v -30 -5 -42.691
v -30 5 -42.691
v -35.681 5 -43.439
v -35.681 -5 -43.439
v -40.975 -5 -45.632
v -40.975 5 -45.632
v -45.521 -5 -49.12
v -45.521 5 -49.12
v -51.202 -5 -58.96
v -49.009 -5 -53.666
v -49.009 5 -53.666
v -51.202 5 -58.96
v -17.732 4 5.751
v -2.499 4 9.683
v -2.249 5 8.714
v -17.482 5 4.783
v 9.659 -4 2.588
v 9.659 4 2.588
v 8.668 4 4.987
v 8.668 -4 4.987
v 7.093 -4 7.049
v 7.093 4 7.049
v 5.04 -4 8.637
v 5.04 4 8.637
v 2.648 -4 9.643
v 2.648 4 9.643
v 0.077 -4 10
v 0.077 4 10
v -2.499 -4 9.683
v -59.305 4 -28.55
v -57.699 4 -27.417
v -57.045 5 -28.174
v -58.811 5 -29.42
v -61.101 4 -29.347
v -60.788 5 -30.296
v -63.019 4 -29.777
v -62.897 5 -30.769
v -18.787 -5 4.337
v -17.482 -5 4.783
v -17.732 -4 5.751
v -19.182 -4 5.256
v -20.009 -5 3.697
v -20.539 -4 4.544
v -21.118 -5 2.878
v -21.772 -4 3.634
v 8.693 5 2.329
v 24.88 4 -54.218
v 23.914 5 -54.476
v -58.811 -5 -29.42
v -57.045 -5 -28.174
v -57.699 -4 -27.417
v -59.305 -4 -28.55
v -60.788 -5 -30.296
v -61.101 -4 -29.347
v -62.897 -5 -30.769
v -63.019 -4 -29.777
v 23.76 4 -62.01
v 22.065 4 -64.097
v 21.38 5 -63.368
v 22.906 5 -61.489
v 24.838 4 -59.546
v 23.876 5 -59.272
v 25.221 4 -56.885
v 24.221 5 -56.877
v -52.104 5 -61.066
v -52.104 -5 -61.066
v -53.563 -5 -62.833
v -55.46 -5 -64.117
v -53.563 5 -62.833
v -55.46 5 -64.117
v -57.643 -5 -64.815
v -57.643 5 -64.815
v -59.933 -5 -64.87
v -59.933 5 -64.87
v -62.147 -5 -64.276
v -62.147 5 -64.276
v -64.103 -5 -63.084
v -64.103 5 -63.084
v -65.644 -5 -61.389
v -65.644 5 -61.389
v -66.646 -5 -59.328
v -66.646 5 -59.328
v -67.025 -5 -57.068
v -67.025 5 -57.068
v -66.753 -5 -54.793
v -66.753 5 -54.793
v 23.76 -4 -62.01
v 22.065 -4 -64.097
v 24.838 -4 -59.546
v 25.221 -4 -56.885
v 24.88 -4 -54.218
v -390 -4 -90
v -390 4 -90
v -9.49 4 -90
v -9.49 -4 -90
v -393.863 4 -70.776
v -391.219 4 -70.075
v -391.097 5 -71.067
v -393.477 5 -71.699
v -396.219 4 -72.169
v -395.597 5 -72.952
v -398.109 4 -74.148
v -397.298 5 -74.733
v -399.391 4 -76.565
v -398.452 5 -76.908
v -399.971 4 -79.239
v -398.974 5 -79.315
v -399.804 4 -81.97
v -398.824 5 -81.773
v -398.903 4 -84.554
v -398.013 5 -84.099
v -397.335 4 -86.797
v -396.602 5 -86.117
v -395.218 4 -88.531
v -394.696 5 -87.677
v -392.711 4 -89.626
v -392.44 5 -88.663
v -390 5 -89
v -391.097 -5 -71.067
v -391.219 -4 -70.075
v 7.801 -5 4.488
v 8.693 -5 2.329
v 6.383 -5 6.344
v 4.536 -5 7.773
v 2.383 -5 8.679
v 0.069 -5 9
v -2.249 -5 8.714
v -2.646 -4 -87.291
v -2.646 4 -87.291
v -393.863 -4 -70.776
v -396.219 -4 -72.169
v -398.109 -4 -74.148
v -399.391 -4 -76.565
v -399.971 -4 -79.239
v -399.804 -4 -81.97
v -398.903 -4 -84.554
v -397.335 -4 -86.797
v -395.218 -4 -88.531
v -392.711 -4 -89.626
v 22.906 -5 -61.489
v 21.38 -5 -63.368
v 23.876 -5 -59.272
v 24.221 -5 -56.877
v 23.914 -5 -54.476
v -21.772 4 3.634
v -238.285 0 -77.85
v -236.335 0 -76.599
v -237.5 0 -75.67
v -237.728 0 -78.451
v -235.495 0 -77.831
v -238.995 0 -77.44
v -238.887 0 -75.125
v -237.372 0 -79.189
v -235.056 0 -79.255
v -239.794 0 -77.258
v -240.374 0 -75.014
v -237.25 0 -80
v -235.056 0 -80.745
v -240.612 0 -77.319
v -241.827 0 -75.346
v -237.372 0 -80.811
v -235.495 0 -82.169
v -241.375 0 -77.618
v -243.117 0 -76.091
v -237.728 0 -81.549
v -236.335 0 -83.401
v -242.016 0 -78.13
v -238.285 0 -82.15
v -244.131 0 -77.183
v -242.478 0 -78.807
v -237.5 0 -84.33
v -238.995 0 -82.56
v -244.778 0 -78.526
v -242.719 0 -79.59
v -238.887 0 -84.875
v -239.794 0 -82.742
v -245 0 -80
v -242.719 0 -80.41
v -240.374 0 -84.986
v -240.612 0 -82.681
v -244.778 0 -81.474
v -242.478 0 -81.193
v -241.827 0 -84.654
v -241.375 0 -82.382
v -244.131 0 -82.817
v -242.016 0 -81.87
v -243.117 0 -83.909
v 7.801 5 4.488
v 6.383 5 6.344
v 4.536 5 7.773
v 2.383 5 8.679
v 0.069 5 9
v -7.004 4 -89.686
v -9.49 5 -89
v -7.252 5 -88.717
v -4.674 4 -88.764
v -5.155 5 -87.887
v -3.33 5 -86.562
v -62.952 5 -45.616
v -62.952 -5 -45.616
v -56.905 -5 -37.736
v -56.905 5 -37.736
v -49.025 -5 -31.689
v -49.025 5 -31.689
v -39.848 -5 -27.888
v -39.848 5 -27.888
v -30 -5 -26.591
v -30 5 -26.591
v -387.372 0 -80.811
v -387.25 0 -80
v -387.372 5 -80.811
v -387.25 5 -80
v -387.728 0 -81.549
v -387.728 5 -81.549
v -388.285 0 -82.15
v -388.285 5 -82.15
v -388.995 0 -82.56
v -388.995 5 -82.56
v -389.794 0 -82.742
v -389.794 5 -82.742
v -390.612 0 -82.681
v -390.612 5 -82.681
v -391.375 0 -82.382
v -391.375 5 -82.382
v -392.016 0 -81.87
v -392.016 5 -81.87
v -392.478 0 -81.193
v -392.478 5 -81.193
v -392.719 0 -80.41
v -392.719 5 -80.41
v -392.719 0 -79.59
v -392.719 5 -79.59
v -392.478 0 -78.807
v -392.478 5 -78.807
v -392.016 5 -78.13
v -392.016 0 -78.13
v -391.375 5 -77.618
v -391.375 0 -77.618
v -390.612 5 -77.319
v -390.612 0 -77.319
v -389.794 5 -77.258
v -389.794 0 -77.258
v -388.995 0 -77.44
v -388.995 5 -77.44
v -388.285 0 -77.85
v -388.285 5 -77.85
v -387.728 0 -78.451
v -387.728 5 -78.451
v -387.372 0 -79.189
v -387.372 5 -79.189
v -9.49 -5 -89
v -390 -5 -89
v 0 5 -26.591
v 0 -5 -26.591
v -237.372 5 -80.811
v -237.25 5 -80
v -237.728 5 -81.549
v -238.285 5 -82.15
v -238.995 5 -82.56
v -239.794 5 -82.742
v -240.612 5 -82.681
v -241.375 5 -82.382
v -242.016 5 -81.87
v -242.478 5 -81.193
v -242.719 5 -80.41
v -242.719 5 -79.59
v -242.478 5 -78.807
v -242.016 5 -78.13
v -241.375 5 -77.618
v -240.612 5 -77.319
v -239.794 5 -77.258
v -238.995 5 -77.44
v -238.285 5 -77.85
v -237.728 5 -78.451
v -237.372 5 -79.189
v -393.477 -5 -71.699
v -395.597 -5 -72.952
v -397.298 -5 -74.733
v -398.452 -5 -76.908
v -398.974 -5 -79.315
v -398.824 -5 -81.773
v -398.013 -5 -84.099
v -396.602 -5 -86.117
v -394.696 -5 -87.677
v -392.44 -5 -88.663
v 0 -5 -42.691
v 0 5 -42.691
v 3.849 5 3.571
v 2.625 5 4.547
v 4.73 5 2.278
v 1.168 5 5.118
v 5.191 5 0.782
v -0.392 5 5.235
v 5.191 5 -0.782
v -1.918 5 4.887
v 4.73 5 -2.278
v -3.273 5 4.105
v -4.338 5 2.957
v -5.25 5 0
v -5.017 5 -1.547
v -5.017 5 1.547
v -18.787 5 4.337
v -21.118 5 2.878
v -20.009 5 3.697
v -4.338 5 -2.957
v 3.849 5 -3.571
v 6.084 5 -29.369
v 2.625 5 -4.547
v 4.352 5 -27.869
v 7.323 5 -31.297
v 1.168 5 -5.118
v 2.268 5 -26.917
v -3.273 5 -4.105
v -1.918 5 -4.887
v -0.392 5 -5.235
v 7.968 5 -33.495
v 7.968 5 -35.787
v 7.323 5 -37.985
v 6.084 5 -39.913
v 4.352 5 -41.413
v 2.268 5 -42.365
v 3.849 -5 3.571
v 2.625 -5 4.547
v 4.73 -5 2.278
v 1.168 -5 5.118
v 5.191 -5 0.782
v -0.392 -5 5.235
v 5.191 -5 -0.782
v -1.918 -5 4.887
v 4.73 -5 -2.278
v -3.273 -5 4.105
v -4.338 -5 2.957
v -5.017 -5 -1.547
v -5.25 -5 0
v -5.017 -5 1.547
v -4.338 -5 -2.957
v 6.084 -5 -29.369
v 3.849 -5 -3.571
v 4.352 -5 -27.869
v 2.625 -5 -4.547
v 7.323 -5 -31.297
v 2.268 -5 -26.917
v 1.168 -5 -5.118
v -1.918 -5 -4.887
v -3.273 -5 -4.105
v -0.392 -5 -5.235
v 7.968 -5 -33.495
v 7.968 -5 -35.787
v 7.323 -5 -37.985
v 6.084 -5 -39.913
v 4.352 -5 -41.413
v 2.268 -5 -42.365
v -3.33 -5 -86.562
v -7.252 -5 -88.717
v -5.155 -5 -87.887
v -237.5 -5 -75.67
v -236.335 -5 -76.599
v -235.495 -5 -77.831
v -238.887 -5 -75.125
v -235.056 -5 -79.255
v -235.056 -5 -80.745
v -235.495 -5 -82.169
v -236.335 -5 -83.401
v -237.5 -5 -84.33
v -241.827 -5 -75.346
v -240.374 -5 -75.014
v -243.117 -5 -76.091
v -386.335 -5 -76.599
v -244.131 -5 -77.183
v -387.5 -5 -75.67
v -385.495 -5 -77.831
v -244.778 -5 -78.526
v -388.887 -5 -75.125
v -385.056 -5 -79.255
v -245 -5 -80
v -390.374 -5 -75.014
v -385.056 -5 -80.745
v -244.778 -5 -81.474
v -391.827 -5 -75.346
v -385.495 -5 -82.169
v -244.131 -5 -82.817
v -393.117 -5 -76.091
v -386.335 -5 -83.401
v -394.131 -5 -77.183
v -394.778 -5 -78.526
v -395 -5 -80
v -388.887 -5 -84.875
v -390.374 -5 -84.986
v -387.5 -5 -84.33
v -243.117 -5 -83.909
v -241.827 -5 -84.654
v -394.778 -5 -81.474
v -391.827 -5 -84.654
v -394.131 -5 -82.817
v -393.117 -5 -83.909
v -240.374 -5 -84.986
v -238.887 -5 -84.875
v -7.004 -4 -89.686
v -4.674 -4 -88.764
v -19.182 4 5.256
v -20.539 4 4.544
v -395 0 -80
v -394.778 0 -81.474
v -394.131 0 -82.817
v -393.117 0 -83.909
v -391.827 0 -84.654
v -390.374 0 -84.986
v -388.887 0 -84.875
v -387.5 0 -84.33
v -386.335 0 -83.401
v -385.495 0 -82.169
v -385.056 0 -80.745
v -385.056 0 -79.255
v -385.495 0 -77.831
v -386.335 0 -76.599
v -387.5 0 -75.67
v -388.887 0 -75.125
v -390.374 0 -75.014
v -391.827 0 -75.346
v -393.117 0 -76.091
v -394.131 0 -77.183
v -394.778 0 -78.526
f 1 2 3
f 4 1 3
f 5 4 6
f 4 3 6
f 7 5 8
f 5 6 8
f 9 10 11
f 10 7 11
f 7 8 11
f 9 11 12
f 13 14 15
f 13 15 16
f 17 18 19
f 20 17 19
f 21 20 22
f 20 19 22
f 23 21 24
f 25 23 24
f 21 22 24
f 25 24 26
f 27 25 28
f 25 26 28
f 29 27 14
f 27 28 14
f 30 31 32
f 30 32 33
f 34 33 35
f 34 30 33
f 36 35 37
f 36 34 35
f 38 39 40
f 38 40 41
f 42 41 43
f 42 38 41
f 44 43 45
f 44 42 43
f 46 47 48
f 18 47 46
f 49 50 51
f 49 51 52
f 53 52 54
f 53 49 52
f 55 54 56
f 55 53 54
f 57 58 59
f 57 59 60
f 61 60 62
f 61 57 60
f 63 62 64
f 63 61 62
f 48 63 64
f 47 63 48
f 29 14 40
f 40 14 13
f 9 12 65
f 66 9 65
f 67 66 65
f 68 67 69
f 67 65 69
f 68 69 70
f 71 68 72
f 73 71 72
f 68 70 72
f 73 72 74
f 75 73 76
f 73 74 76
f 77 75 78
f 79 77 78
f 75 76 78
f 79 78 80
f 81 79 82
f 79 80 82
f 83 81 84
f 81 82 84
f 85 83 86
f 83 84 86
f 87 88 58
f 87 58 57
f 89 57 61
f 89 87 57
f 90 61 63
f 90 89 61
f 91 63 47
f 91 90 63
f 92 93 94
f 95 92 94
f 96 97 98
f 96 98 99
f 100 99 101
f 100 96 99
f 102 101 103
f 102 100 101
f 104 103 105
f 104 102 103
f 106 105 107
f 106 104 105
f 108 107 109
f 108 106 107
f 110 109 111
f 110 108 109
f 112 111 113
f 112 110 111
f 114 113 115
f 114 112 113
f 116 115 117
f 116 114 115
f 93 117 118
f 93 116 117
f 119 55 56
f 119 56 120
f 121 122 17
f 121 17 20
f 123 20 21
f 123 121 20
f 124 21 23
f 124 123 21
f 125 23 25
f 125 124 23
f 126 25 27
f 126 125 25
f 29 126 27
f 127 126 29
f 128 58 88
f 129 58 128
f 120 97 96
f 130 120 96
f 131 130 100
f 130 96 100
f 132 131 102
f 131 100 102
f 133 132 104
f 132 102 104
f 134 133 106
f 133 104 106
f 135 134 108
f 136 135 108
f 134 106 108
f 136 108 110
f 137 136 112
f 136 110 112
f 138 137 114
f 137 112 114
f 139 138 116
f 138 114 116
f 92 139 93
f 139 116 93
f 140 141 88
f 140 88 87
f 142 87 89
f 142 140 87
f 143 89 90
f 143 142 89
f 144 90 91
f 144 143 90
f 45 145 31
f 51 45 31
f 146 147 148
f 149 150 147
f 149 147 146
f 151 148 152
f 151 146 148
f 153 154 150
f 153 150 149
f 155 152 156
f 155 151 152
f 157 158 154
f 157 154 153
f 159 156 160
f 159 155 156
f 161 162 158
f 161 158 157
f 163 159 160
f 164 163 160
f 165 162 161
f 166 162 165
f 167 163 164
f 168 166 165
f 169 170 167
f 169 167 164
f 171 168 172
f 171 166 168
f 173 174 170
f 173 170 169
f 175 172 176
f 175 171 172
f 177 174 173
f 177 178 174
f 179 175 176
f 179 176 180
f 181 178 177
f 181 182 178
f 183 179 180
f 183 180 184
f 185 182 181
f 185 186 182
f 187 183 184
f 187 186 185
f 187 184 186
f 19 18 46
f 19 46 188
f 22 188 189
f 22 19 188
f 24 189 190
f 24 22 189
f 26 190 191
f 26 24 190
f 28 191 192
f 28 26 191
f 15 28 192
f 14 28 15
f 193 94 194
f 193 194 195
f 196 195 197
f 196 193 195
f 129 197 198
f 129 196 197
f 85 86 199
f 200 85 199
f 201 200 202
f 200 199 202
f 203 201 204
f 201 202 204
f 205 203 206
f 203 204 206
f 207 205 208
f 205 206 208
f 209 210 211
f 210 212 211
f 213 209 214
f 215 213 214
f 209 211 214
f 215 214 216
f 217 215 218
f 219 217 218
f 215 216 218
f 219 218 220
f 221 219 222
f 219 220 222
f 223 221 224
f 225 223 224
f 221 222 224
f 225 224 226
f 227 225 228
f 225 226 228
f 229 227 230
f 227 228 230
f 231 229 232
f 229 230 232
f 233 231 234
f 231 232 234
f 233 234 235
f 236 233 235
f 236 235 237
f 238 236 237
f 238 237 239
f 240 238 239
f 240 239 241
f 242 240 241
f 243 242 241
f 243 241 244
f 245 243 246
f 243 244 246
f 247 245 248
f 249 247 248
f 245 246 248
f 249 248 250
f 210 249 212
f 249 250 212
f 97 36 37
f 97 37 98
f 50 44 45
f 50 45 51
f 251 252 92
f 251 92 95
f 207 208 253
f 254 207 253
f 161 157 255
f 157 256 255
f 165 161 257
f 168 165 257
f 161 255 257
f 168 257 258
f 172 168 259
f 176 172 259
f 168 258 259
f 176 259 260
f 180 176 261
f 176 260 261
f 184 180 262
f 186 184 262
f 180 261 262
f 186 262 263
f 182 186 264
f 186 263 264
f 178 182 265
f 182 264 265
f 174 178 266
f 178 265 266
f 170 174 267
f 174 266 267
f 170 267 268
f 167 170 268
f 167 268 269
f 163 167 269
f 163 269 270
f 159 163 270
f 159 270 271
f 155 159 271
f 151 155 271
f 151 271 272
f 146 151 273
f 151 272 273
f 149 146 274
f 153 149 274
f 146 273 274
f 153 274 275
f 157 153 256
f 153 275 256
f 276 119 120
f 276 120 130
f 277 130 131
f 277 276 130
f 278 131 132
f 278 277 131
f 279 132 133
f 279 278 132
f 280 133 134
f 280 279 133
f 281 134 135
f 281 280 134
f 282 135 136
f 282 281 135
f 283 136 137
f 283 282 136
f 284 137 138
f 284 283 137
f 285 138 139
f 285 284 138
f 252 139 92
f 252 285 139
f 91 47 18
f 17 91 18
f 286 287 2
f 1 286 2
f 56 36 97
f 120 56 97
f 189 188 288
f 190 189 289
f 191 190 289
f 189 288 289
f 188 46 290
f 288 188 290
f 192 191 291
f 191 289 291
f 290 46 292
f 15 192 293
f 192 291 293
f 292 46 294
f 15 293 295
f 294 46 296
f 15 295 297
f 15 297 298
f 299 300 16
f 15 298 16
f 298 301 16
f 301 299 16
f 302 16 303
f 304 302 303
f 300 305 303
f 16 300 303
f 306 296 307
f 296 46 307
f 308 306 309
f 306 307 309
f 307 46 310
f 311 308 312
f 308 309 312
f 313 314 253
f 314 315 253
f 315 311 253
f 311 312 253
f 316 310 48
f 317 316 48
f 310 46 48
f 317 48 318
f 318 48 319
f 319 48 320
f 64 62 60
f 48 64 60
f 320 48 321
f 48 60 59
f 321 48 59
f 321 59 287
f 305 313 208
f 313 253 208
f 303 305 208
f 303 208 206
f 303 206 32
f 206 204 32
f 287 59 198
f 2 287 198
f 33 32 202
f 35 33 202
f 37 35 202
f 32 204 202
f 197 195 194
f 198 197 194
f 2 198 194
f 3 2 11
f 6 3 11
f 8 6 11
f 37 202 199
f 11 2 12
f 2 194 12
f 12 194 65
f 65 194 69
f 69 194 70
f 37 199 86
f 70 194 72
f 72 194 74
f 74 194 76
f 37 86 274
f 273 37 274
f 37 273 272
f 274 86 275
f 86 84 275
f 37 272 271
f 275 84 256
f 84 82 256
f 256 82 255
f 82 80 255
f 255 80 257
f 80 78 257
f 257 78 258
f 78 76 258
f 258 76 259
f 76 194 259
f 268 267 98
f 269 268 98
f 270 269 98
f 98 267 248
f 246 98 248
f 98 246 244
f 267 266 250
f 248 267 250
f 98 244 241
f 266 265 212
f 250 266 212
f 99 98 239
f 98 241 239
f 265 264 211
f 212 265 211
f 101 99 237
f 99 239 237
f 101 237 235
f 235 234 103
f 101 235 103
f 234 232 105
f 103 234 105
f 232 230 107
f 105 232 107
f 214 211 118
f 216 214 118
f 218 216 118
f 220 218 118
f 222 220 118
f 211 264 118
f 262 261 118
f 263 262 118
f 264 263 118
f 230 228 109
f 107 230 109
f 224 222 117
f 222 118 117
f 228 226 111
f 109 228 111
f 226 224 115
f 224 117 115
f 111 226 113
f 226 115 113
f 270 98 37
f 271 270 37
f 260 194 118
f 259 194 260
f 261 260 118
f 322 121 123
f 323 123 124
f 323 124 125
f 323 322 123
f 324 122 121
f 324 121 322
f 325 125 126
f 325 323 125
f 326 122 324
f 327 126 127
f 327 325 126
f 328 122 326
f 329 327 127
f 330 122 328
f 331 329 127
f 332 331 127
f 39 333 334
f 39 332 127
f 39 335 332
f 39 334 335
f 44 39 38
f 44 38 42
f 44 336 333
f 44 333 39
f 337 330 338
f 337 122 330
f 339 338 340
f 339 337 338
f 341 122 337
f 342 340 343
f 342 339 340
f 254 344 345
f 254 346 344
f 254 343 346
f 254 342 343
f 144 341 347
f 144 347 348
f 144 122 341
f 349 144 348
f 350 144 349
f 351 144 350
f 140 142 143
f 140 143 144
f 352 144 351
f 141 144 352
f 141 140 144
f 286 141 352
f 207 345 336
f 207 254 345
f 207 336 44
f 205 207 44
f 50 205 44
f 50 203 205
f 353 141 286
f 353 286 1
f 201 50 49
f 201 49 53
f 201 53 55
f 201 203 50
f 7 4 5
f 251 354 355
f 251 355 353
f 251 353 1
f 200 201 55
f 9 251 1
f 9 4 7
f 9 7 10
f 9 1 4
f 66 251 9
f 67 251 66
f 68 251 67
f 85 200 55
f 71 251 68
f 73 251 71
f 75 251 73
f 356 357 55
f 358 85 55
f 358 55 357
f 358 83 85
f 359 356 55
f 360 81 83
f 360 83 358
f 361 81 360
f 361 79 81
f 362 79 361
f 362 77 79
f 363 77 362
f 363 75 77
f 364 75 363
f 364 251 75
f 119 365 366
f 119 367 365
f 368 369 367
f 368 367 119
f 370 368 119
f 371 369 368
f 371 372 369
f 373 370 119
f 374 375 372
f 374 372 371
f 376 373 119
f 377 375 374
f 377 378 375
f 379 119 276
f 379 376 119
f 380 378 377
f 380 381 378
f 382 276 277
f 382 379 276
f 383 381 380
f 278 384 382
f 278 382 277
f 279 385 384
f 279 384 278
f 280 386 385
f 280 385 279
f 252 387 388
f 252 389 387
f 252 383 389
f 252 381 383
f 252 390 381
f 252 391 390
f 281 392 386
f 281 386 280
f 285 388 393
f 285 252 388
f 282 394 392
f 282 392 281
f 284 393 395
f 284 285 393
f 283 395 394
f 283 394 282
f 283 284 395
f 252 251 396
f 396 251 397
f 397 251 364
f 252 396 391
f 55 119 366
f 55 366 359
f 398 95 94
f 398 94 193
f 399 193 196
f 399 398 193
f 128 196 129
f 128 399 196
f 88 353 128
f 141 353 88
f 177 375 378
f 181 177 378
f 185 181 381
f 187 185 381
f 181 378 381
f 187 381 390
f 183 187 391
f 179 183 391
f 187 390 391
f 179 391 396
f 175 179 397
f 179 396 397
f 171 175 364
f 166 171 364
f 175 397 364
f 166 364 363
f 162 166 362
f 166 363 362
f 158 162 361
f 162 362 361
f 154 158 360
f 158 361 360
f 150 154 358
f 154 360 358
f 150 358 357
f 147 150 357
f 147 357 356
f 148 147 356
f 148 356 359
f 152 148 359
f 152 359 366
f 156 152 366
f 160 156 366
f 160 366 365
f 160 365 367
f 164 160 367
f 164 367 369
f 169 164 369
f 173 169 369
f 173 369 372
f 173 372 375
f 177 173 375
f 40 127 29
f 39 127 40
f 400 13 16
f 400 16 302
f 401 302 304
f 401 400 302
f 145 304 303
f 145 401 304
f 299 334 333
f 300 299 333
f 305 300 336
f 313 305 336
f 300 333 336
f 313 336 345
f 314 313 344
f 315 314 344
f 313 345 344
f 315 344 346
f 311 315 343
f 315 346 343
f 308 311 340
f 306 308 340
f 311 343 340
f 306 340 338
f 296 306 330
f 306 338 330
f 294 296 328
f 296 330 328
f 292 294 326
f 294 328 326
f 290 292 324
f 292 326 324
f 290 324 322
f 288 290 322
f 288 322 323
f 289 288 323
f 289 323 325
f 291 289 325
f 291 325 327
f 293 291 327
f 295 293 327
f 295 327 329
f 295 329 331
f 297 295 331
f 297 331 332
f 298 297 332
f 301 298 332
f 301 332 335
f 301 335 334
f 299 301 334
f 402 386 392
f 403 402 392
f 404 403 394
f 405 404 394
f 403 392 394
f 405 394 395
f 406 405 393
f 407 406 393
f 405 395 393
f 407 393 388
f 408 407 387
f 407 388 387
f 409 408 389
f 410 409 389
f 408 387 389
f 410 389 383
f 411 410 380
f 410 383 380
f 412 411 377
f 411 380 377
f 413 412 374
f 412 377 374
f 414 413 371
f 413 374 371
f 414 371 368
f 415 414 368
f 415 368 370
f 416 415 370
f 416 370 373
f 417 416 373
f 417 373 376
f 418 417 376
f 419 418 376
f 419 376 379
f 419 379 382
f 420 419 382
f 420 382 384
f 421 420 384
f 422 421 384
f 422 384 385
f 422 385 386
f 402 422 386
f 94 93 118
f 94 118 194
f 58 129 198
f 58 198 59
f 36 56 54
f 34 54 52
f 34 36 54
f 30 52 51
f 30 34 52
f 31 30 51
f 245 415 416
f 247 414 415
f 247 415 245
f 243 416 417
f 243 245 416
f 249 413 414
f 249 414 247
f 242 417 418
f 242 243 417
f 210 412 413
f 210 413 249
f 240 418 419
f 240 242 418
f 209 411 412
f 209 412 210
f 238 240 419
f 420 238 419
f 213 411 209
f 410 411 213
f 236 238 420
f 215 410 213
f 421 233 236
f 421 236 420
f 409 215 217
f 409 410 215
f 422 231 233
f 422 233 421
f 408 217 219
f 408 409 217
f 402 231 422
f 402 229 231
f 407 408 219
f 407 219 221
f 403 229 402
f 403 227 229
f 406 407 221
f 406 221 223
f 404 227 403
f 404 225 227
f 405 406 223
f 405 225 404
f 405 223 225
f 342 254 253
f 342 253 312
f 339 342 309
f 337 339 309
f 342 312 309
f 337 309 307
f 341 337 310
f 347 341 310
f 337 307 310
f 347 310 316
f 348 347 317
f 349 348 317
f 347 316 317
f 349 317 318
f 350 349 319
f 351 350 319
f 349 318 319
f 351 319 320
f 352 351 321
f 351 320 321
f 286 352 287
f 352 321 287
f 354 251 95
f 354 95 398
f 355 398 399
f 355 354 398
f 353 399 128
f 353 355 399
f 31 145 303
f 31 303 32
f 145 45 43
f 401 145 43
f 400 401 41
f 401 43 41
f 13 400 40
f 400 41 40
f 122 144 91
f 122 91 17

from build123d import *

# Parameters (mm, degrees)
BOSS_EXTRUDE1_DEPTH              = 5
SLOT_DEPTH                       = 11
F_10_5_10_5_DIAMETER_HOLE1_D     = 10.5
F_10_5_10_5_DIAMETER_HOLE1_DEPTH = 15
F_10_5_10_5_DIAMETER_HOLE1_TIP   = 3.15451825
CBORE_FOR_M5_SHCS2_D             = 5.5
CBORE_FOR_M5_SHCS2_DEPTH         = 21.6
CBORE_FOR_M5_SHCS2_CBORE_D       = 10
CBORE_FOR_M5_SHCS2_CBORE_DEPTH   = 5
CBORE_FOR_M5_SHCS2_TIP           = 1.652366702
CUT_EXTRUDE3_DEPTH               = 11
FILLET1_R                        = 10
CHAMFER1_SIZE                    = 1


with BuildPart() as part:
    # Sketch1 → Boss-Extrude1 (new body, symmetric)
    with BuildSketch(Plane(origin=(0, 0, 0), x_dir=(1, 0, 0), z_dir=(0, 1, 0))):
        with BuildLine():
            Line((-390, 90), (34.468189123, 90))
            Line((34.468189123, 90), (9.659258263, -2.588190451))
            ThreePointArc((9.659258263, -2.588190451), (5.03987296, -8.63711066), (-2.499017827, -9.682711908))
            Line((-2.499017827, -9.682711908), (-20, -5.16587129))
            Line((-20, -5.16587129), (-60, 29.405996647))
            Line((-60, 29.405996647), (-391.218693434, 70.074538484))
            ThreePointArc((-391.218693434, 70.074538484), (-399.981347984, 80.610485395), (-390, 90))
        make_face()
    extrude(amount=BOSS_EXTRUDE1_DEPTH, both=True)

    # Sketch4 → Slot (cut, through all)
    with BuildSketch(Plane(origin=(0, 5, 0), x_dir=(1, 0, 0), z_dir=(0, 1, 0))):
        with BuildLine():
            Line((-30, 26.591016), (0, 26.591016))
            ThreePointArc((0, 26.591016), (8.05, 34.641016), (0, 42.691016))
            Line((0, 42.691016), (-30, 42.691016))
            ThreePointArc((-30, 42.691016), (-43.362313367, 47.226910181), (-51.202071887, 58.95993796))
            ThreePointArc((-51.202071887, 58.95993796), (-61.061268102, 64.652147549), (-66.75347769, 54.792951334))
            ThreePointArc((-66.75347769, 54.792951334), (-53.163372374, 34.453921402), (-30, 26.591016))
        make_face()
    extrude(amount=-SLOT_DEPTH, mode=Mode.SUBTRACT)

    # Ø10.5 (10.5) Diameter Hole1
    with Locations(Plane(origin=(0, 5, 0), x_dir=(1, 0, 0), z_dir=(0, 1, 0))):
        with Locations((0, 0)):
            Hole(F_10_5_10_5_DIAMETER_HOLE1_D / 2, depth=F_10_5_10_5_DIAMETER_HOLE1_DEPTH)
            with Locations((0, 0, -(F_10_5_10_5_DIAMETER_HOLE1_DEPTH + F_10_5_10_5_DIAMETER_HOLE1_TIP / 2))):  # 118° drill point
                Cone(0, F_10_5_10_5_DIAMETER_HOLE1_D / 2, F_10_5_10_5_DIAMETER_HOLE1_TIP, mode=Mode.SUBTRACT)

    # CBORE for M5 SHCS2
    with Locations(Plane(origin=(0, -5, 0), x_dir=(-1, 0, 0), z_dir=(0, -1, 0))):
        with Locations((390, 80), (240, 80)):
            CounterBoreHole(CBORE_FOR_M5_SHCS2_D / 2, CBORE_FOR_M5_SHCS2_CBORE_D / 2, CBORE_FOR_M5_SHCS2_CBORE_DEPTH, depth=CBORE_FOR_M5_SHCS2_DEPTH)
            with Locations((0, 0, -(CBORE_FOR_M5_SHCS2_DEPTH + CBORE_FOR_M5_SHCS2_TIP / 2))):  # 118° drill point
                Cone(0, CBORE_FOR_M5_SHCS2_D / 2, CBORE_FOR_M5_SHCS2_TIP, mode=Mode.SUBTRACT)

    # Sketch13 → Cut-Extrude3 (cut, through all)
    with BuildSketch(Plane(origin=(0, 5, 0), x_dir=(1, 0, 0), z_dir=(0, 1, 0))):
        Polygon((-5.531810877, 90), (34.468189123, 90), (26.42971335, 60), align=None)
    extrude(amount=-CUT_EXTRUDE3_DEPTH, mode=Mode.SUBTRACT)

    # Fillet1
    fillet1_edges = [part.edges().sort_by_distance(p)[0] for p in [
        (-20, 0, 5.16587129),
        (-60, 0, -29.405996647),
        (26.42971335, 0, -60),
        (-5.531810877, 0, -90),
    ]]
    fillet(fillet1_edges, radius=FILLET1_R)

    # Chamfer1
    chamfer1_edges = [part.edges().sort_by_distance(p)[0] for p in [
        (-399.981347984, -5, -80.610485395),
        (5.03987296, 5, 8.63711066),
        (17.26978309, 5, -25.814674877),
        (-399.981347984, 5, -80.610485395),
        (9.709435896, 5, -75.694130232),
        (9.709435896, -5, -75.694130232),
        (-199.744878532, 5, -90),
        (-39.735397279, 5, -11.891367421),
        (17.26978309, -5, -25.814674877),
        (-10.11553696, 5, 7.716959206),
        (-19.874383451, 5, 4.92614185),
        (24.83814676, 5, -59.546431893),
        (-5.80958377, 5, -89.298189314),
        (-199.744878532, -5, -90),
        (-10.11553696, -5, 7.716959206),
        (5.03987296, -5, 8.63711066),
        (-39.735397279, -5, -11.891367421),
        (-19.874383451, -5, 4.92614185),
        (24.83814676, -5, -59.546431893),
        (-5.80958377, -5, -89.298189314),
        (-60.183408772, -5, -28.992469299),
        (-227.118878147, 5, -49.925614719),
        (-60.183408772, 5, -28.992469299),
        (-227.118878147, -5, -49.925614719),
    ]]
    chamfer(chamfer1_edges, length=CHAMFER1_SIZE)


solid = part.part
